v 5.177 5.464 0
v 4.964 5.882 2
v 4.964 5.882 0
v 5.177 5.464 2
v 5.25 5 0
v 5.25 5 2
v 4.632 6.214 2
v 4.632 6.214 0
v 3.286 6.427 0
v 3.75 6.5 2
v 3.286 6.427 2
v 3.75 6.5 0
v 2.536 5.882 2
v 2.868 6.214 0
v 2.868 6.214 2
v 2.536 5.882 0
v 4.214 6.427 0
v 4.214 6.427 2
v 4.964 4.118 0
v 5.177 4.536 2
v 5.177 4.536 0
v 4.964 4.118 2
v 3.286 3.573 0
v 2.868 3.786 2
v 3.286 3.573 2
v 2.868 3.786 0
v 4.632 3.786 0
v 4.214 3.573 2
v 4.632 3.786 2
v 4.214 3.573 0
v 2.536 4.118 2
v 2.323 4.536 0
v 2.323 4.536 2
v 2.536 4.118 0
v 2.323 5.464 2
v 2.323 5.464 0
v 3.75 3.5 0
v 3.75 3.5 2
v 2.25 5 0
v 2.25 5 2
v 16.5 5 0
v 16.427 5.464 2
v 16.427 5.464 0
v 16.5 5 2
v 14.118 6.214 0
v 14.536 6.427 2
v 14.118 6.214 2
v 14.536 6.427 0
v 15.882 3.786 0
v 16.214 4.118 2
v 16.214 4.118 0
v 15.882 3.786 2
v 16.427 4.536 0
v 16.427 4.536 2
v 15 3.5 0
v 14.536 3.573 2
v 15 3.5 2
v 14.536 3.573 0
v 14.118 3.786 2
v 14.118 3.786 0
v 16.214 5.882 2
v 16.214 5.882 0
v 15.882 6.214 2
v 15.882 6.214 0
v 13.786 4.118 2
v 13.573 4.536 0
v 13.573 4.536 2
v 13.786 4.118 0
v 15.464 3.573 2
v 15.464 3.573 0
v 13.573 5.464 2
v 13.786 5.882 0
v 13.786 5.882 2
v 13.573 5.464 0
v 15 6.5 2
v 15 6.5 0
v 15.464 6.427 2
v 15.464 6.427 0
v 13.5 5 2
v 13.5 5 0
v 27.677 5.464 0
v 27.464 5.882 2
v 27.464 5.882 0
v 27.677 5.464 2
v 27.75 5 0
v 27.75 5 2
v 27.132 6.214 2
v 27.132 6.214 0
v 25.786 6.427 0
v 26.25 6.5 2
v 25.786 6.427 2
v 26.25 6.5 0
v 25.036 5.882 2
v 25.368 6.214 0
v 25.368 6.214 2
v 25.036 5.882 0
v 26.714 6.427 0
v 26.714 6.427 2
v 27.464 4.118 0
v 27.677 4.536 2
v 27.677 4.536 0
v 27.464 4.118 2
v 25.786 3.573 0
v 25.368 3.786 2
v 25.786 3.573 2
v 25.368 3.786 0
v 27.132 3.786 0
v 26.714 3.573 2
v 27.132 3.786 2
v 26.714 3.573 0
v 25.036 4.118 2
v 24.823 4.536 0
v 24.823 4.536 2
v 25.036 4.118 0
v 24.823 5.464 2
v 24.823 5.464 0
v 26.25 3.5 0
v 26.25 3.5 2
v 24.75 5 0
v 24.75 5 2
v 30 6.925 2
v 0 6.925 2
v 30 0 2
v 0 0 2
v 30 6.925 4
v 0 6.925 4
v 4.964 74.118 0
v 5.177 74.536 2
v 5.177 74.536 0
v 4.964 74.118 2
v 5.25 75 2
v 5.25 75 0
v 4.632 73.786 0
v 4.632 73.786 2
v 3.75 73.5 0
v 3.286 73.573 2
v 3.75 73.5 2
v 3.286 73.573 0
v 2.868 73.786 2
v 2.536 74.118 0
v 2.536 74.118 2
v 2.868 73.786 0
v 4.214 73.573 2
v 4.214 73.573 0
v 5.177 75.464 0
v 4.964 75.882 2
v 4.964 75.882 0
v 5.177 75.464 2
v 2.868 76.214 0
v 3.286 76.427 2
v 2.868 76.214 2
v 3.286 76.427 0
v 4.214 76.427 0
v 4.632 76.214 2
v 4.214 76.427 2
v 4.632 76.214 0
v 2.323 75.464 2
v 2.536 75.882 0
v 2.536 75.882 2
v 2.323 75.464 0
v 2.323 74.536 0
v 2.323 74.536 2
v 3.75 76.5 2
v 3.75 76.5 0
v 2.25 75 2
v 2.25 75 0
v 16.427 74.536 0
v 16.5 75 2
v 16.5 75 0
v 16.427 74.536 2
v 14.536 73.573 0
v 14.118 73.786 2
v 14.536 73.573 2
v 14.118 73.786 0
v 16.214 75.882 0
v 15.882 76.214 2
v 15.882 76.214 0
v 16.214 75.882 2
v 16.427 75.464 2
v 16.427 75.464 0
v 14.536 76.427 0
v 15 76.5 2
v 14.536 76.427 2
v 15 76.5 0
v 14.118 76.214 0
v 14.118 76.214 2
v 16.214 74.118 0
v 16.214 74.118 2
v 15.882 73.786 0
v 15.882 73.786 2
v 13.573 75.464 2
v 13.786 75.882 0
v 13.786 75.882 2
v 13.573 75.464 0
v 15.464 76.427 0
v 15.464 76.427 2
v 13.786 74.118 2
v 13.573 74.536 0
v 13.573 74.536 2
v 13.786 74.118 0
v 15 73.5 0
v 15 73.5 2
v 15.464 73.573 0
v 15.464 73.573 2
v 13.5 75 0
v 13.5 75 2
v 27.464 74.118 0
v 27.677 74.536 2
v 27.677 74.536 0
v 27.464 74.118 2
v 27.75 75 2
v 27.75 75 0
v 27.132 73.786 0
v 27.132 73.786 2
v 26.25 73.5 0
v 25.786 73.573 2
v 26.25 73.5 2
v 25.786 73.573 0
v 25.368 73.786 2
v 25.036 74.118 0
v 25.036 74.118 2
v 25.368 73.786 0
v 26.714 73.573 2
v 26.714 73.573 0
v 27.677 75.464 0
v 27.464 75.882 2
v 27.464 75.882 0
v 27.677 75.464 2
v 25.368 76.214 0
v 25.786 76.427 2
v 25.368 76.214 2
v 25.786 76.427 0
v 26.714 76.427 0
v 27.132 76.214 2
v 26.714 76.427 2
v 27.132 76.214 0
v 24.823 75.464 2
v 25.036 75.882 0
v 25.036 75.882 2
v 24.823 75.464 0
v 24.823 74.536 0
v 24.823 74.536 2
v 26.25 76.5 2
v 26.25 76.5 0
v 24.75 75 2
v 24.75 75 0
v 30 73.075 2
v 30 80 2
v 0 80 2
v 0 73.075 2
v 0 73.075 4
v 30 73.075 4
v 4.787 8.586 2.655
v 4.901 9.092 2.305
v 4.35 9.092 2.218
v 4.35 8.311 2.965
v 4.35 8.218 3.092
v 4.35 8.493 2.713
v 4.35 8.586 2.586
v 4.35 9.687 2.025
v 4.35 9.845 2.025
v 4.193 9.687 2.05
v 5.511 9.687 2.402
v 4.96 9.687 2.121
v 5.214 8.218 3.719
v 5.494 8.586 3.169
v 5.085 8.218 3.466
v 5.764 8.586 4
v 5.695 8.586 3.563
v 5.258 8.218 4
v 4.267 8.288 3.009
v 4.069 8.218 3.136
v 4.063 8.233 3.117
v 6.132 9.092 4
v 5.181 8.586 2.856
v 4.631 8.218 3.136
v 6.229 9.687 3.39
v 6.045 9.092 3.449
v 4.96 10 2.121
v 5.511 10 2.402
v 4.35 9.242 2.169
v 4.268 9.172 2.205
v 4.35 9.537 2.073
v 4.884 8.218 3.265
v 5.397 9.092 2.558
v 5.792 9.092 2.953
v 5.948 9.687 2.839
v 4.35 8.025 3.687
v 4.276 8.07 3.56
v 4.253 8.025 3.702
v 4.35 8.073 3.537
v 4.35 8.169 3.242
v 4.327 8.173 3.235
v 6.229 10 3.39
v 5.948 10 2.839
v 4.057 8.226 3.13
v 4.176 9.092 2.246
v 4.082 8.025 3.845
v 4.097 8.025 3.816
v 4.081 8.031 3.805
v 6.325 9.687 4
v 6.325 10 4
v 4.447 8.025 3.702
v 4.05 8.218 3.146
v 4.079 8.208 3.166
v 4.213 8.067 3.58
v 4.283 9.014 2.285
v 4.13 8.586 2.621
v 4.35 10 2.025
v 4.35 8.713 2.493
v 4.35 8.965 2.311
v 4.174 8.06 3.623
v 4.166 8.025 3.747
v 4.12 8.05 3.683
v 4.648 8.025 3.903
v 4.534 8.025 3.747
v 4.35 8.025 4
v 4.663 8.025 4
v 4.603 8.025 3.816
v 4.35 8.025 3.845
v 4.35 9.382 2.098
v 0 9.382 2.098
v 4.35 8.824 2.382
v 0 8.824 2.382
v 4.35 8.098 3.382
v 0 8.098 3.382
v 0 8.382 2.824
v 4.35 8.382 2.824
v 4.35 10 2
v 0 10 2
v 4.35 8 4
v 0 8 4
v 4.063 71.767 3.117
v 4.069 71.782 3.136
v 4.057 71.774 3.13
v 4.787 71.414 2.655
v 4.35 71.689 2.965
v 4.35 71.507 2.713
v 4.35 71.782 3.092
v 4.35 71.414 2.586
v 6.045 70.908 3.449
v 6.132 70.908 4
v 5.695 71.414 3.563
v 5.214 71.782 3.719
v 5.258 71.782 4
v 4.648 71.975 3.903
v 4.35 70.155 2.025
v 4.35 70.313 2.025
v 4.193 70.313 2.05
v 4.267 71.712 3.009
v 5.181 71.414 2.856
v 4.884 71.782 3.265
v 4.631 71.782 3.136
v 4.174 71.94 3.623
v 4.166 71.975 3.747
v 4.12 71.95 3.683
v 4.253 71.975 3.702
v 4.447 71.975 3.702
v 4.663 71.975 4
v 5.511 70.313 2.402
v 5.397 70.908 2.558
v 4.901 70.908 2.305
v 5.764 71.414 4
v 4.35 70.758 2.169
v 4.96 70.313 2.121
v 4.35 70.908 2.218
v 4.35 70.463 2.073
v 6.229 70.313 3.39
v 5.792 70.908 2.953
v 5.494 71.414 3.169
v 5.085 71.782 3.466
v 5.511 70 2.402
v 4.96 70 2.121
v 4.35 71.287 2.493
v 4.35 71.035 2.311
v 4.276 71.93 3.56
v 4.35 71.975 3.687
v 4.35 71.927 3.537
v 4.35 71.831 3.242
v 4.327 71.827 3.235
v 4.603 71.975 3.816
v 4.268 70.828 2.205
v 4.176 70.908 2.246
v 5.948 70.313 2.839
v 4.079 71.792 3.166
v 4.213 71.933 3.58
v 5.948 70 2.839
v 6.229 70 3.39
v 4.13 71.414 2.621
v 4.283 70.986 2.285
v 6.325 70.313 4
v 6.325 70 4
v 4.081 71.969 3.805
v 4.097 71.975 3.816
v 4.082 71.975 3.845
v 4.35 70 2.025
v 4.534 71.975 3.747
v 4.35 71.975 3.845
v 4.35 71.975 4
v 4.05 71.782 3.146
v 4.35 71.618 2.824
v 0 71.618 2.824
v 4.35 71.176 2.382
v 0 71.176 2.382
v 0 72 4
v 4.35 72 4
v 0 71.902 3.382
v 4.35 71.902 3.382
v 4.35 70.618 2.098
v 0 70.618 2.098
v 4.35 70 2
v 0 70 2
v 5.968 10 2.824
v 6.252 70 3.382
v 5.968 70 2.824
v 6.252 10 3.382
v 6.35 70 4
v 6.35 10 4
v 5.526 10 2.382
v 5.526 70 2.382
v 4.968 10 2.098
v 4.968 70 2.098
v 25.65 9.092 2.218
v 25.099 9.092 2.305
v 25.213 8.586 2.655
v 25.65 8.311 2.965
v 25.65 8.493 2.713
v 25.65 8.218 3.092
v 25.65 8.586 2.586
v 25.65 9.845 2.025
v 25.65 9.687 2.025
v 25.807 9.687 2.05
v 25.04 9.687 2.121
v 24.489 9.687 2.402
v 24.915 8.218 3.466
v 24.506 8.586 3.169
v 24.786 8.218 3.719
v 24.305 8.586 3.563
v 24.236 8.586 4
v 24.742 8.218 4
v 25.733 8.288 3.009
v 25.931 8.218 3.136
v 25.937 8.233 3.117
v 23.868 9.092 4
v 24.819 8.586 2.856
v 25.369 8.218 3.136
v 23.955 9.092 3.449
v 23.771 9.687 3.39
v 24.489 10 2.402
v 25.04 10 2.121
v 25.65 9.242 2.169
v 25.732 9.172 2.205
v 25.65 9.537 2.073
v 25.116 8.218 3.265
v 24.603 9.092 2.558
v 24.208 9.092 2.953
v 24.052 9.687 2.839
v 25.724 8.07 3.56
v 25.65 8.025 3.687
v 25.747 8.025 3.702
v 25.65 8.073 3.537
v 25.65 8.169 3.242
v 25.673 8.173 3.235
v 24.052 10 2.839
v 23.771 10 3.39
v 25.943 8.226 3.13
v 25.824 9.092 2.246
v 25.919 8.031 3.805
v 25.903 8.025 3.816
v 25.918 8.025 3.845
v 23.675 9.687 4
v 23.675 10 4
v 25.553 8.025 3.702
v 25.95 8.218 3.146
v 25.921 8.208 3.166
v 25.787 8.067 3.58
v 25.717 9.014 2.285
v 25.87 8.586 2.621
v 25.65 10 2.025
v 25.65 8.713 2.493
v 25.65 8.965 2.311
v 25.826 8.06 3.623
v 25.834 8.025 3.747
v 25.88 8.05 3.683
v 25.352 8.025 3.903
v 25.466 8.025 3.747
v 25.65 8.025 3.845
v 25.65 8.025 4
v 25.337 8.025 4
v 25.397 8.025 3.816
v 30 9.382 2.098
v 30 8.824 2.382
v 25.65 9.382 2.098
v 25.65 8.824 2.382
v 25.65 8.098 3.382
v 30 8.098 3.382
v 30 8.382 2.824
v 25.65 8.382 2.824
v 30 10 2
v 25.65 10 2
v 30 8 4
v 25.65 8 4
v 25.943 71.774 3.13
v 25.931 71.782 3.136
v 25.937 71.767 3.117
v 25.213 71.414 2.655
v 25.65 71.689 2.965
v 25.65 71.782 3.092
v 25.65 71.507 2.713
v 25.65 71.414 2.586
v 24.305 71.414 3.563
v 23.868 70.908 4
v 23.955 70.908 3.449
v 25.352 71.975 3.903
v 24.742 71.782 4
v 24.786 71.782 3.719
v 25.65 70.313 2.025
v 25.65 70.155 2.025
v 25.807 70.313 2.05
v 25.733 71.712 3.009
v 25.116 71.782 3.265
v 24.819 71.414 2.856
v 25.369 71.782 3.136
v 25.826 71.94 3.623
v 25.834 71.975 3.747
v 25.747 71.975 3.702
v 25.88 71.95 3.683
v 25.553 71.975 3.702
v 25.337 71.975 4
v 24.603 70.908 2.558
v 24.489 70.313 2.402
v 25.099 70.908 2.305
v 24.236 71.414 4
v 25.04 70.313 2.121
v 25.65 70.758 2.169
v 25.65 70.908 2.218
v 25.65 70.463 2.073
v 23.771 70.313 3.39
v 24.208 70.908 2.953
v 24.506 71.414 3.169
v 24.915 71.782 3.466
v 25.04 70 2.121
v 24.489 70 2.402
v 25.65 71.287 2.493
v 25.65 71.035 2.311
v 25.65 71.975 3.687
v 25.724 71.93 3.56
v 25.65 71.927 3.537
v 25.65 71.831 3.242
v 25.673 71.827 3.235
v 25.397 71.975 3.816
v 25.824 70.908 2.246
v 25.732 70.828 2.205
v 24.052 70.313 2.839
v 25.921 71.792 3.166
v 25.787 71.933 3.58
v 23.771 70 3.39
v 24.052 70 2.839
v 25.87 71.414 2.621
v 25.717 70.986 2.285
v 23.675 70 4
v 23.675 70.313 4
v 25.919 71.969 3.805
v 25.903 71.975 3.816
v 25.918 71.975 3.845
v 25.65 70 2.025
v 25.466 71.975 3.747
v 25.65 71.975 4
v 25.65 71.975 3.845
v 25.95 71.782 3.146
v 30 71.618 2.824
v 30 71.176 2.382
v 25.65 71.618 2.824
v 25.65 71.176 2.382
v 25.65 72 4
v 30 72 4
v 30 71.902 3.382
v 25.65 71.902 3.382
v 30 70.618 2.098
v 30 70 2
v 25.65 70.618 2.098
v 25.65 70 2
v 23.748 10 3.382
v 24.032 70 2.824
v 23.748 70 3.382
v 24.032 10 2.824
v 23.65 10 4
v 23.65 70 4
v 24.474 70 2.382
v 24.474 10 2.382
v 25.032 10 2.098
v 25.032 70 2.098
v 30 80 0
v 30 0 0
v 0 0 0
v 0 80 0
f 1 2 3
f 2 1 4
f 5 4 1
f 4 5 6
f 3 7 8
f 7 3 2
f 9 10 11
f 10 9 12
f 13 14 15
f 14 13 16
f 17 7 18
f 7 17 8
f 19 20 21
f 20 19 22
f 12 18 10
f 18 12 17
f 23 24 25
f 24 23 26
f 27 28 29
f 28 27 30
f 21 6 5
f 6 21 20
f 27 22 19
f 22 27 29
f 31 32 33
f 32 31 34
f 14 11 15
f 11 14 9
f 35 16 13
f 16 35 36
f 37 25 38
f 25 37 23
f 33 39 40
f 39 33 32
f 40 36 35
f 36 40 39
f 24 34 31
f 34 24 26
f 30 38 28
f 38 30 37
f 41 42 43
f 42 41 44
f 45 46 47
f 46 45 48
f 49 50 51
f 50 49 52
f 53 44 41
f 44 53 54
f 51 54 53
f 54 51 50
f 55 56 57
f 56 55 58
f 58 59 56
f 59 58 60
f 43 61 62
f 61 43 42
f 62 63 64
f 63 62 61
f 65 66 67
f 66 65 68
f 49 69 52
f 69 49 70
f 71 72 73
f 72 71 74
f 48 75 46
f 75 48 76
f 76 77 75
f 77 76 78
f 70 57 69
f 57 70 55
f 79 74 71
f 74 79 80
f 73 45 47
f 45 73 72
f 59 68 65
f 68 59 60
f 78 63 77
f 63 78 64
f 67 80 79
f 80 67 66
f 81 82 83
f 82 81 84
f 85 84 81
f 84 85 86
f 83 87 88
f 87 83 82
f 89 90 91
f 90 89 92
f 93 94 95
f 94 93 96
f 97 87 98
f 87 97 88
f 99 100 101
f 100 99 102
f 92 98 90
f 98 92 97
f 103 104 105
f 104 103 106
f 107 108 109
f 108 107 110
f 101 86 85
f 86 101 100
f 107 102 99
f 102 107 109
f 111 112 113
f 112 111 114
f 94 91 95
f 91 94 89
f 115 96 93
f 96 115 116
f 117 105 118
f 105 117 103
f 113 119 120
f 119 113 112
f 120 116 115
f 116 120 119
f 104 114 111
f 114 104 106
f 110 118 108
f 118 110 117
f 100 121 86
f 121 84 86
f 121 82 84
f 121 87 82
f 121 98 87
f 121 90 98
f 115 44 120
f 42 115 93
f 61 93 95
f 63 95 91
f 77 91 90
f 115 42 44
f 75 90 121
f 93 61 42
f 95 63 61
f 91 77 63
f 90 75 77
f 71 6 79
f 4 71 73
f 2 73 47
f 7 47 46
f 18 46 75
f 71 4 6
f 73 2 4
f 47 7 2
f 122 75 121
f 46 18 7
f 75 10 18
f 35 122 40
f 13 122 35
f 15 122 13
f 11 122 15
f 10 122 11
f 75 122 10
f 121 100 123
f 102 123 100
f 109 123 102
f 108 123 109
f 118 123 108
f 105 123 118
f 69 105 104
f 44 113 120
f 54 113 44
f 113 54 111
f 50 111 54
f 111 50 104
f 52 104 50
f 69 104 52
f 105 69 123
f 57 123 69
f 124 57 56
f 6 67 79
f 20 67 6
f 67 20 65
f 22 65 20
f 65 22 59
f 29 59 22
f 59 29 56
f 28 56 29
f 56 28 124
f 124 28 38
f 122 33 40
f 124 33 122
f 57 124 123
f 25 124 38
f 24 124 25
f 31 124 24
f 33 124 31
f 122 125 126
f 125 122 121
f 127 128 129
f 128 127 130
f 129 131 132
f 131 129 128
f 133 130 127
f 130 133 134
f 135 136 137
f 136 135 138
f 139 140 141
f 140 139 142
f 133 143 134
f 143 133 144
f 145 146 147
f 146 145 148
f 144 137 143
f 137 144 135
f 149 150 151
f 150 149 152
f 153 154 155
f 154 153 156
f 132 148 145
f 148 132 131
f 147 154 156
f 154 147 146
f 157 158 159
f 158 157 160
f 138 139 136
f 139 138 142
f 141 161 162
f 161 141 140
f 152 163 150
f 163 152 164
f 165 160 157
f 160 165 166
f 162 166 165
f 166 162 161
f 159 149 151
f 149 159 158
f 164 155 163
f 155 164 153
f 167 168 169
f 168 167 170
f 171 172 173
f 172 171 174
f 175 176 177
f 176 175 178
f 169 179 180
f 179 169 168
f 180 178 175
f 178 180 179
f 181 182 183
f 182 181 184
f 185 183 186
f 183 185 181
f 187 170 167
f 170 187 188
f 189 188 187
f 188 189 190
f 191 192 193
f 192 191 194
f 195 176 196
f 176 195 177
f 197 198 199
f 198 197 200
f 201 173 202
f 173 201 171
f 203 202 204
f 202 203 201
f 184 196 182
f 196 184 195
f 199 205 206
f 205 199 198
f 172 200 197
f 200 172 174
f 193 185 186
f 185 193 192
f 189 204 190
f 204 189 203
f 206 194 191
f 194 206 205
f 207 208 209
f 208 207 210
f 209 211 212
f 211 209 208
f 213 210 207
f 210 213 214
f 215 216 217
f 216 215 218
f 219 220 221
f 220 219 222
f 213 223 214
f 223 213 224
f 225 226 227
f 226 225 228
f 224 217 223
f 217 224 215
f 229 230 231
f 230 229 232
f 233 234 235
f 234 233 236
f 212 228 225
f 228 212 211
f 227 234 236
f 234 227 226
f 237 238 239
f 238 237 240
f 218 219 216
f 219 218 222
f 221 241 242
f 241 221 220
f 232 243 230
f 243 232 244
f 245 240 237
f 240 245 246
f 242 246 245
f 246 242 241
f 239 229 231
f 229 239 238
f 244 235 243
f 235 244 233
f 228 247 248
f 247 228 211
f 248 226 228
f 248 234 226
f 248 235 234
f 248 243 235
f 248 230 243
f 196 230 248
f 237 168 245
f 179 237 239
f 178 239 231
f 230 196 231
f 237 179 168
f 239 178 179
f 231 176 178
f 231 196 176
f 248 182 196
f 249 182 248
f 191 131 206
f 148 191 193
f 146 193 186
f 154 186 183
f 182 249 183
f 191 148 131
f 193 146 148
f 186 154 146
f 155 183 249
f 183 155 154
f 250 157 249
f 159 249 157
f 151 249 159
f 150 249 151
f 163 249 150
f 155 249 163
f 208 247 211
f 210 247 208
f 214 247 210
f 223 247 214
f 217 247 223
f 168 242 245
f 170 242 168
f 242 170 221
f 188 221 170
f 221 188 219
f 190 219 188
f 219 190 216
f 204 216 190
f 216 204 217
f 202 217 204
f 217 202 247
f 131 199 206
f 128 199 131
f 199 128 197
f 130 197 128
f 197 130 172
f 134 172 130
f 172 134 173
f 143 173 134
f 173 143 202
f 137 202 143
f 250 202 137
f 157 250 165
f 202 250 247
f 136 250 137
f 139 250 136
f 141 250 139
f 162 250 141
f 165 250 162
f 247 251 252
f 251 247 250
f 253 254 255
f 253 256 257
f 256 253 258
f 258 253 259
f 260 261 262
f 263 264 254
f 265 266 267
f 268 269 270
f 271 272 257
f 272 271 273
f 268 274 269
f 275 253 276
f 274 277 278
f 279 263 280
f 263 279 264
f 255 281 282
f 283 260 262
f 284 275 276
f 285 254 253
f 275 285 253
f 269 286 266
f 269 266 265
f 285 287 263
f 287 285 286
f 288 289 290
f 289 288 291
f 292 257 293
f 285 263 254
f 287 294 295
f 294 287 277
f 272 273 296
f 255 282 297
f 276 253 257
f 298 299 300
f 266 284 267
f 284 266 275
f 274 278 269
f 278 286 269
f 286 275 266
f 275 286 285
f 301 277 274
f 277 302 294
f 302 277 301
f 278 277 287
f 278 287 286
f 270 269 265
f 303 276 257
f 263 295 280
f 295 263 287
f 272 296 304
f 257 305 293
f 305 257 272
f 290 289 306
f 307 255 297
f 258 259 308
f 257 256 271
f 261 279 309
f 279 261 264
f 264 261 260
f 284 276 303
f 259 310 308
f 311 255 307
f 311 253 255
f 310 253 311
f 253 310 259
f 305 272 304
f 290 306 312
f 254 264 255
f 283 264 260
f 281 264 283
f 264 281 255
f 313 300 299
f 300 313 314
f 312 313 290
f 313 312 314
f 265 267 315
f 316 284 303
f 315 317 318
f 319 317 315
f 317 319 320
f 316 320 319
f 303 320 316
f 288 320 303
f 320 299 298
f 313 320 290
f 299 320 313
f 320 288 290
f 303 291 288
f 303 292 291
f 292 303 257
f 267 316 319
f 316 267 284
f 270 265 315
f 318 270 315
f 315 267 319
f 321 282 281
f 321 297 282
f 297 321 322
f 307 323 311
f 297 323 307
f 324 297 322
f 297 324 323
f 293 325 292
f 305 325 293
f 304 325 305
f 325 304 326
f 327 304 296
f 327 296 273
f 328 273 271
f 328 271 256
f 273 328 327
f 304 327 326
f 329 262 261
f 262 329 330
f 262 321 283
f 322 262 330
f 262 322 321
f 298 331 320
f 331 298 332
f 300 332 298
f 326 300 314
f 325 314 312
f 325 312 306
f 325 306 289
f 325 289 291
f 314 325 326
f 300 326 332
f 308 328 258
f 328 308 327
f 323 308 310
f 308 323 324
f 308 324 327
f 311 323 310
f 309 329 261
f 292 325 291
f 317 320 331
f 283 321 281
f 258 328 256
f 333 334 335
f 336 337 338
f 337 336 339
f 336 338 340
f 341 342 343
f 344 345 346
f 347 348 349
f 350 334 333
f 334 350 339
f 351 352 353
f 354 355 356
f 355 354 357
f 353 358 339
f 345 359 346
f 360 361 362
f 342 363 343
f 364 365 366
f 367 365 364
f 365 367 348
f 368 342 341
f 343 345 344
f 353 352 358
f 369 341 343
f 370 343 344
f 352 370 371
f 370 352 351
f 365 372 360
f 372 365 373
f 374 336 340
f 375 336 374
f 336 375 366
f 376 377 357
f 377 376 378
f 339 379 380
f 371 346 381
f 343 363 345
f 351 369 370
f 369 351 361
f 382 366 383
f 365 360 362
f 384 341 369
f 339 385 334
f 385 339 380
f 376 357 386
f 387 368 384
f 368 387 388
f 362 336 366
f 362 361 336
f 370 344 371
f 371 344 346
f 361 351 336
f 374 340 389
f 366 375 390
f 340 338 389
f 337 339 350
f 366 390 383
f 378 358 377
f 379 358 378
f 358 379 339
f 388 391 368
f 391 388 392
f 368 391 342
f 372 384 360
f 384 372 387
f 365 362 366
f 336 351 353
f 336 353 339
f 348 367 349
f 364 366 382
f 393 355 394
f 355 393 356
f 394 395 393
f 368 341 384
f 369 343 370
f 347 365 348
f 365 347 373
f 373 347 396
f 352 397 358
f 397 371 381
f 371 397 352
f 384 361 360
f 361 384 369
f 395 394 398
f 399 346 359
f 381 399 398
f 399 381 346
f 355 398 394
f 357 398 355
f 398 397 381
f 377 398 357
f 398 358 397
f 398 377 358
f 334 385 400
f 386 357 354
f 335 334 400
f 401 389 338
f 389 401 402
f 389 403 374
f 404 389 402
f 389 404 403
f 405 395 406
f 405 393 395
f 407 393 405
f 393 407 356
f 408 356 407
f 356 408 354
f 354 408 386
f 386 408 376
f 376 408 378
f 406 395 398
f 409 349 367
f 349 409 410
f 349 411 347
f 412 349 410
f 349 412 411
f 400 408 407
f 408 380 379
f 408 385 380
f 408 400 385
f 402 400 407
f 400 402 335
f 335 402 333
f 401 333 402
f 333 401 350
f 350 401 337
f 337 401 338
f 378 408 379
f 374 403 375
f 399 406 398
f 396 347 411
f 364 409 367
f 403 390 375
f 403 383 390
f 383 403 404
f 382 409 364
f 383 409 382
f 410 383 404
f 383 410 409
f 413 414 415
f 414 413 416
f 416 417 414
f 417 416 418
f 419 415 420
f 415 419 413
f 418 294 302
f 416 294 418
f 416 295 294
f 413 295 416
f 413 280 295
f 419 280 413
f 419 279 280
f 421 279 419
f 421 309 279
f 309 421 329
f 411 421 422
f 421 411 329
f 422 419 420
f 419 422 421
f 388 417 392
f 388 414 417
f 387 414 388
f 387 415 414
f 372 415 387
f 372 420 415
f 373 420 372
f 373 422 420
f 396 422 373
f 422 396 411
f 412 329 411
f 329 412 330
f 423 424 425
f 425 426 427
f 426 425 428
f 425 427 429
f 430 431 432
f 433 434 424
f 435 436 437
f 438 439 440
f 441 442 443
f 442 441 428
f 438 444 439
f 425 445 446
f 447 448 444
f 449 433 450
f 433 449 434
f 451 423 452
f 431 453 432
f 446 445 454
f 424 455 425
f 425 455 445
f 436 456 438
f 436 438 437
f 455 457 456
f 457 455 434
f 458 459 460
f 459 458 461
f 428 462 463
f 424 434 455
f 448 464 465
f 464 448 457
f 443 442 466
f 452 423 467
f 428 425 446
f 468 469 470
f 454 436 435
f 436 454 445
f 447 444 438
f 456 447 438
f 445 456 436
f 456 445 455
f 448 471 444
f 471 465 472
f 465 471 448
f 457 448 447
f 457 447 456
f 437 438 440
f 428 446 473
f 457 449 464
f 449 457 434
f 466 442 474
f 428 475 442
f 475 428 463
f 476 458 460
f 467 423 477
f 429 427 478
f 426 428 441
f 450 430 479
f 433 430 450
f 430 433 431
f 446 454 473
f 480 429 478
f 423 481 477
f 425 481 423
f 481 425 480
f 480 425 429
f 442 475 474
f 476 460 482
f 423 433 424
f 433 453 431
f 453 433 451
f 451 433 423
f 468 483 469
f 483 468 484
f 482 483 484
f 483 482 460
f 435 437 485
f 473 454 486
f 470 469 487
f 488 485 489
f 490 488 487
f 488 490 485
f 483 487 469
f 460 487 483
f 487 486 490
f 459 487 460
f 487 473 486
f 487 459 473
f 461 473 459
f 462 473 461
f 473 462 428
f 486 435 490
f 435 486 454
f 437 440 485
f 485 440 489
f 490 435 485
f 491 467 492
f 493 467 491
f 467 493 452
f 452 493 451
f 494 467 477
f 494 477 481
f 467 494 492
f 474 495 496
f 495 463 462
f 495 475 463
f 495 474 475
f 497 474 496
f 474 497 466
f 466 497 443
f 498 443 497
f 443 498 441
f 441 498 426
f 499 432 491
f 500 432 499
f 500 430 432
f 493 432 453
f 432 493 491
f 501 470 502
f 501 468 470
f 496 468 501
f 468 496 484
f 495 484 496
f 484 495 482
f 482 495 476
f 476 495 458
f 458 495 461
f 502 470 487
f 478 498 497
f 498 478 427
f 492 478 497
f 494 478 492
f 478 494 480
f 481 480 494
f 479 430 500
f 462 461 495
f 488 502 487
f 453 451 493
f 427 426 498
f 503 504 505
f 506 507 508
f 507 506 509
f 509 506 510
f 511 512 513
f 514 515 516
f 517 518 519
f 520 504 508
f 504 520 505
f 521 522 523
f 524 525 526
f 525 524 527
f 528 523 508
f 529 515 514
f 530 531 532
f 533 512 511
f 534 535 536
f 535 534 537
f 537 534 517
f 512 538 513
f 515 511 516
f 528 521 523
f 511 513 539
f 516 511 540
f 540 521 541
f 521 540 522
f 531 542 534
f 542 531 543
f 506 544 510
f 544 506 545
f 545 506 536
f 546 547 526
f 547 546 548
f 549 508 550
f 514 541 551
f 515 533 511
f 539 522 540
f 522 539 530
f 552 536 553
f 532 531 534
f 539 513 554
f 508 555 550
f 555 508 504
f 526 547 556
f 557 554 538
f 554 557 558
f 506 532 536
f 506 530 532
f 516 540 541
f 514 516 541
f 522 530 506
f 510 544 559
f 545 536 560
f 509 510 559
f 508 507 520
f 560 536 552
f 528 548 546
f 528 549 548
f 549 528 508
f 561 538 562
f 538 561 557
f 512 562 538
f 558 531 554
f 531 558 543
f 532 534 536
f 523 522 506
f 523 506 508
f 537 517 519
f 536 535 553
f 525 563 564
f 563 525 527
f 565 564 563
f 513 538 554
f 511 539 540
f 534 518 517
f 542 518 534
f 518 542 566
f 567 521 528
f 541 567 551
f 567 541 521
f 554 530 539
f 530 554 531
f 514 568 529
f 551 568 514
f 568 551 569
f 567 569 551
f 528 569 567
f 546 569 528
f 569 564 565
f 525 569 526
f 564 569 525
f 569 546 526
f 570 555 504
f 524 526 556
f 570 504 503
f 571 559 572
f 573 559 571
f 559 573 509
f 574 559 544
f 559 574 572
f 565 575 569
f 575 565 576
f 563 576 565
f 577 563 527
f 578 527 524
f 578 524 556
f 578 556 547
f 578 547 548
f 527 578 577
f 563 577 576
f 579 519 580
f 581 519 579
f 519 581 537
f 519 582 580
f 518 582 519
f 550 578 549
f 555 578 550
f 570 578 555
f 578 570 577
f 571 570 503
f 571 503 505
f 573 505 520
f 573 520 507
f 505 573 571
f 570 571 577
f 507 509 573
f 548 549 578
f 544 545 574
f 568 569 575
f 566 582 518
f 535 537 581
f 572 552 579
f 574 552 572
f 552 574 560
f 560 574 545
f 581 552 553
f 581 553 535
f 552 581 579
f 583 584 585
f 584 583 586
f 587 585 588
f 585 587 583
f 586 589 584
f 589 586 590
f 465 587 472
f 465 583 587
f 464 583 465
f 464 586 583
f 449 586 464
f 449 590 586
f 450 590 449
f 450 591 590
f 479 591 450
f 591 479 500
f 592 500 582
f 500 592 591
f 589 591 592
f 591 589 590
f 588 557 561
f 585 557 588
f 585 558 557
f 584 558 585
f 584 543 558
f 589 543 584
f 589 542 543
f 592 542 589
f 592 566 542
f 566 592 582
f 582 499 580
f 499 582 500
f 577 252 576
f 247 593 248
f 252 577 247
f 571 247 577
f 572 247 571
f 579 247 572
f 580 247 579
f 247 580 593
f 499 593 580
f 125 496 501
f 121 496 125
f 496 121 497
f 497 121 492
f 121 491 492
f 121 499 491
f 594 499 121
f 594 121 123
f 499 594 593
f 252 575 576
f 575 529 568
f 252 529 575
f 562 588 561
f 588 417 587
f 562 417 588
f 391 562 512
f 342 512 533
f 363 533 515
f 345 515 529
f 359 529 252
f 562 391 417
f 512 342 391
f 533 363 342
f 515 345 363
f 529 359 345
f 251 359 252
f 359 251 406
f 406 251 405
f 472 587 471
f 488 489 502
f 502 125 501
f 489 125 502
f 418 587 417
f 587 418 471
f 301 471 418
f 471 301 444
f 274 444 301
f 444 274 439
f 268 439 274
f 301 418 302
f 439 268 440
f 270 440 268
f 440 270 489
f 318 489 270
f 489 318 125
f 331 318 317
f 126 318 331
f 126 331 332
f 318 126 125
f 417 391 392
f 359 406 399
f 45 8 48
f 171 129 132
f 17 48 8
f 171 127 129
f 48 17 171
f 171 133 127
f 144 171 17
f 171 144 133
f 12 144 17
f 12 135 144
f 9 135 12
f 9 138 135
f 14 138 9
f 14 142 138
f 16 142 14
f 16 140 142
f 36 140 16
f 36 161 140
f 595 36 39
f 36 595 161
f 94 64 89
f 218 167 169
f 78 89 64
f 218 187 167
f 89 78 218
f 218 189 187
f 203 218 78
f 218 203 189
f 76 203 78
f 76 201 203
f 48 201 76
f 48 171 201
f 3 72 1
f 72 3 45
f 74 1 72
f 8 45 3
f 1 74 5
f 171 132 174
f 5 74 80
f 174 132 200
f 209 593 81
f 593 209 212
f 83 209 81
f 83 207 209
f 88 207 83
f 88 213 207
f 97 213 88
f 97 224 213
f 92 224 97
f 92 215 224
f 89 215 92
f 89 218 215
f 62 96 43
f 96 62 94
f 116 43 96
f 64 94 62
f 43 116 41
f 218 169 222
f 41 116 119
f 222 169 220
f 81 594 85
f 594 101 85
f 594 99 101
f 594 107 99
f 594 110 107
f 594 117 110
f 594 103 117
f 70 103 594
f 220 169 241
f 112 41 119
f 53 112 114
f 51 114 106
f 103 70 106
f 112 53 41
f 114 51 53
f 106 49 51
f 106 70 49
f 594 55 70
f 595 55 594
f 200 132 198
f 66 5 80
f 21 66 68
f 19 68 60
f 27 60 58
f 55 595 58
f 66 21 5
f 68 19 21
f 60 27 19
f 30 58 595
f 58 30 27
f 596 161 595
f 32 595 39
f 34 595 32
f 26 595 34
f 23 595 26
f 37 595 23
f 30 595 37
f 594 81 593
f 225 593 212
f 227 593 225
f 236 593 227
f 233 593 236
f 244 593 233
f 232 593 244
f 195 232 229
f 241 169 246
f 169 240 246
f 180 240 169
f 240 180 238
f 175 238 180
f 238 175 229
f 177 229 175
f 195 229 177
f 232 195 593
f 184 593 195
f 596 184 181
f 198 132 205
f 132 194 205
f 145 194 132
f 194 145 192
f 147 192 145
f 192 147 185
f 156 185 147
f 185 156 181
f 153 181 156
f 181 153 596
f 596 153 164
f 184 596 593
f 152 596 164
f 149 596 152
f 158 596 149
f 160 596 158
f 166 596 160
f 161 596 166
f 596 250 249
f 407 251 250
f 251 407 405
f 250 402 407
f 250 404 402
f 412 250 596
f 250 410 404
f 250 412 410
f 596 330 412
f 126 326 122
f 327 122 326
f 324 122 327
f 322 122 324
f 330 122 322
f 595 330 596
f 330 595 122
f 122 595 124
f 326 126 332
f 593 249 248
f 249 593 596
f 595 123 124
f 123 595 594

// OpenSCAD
th=30;
td=4;
tw=80;
main();
module main() {
difference() {
  cube([th,tw,td]);
  translate([0,tw/2]) for(m=[0,1]) mirror([0,m]) translate([0,tw/-2]) {
    for(x=[th/8,th/2,th*7/8])
      translate([x,5,-.1]) cylinder(d=3,h=td+.2,$fn=20);
    translate([-.1,-.1,td/2]) cube([th+.2,10.2-25.4/8,td+.1]);
  }
  translate([th/2,0]) for(m=[0,1]) mirror([m,0]) translate([th/-2,0]) {
  translate([-.1,10,td/2])
    cube([.1+(25.4/4)-2,tw-20,td/2+.1]);
  translate([25.4/4-td/2,10,td]) rotate([-90,0]) {
    cylinder(r=td/2,h=tw-20,$fn=20);
    for(y=[0,tw-20]) translate([0,0,y]) {
    sphere(r=td/2,$fn=20);
    rotate([0,-90]) cylinder(r=td/2,h=25.4/4,$fn=20);
    }
  }
  }
}
}
module side() {
translate([0,0,-2]) rotate([90,0]) difference() {
  translate([0,2]) cube([th,7.8,tw]);
  translate([0,0,tw/2]) for(m=[0,1]) mirror([0,0,m]) translate([0,0,tw/-2]) {
  translate([-.1,10-td/2,0]) cube([th+.2,td/2+.1,td+.2]);
  translate([-.1,-.1,-.1]) cube([th+.2,10,td/2+.2]);
  }
  for(x=[th/8,th/2,th*7/8])
    translate([x,5,-.1]) cylinder(d=3,h=tw+.2,$fn=20);
  translate([th/2,0]) for(m=[0,1]) mirror([m,0]) translate([th/-2,0]) {
  translate([25.4/4-td/2,10,0]) cylinder(r=td/2,h=tw+.2,$fn=20);
  translate([-.1,10-td/2,0]) cube([25.4/4-td/2,td/2,tw+.2]);
  }
}
} 
